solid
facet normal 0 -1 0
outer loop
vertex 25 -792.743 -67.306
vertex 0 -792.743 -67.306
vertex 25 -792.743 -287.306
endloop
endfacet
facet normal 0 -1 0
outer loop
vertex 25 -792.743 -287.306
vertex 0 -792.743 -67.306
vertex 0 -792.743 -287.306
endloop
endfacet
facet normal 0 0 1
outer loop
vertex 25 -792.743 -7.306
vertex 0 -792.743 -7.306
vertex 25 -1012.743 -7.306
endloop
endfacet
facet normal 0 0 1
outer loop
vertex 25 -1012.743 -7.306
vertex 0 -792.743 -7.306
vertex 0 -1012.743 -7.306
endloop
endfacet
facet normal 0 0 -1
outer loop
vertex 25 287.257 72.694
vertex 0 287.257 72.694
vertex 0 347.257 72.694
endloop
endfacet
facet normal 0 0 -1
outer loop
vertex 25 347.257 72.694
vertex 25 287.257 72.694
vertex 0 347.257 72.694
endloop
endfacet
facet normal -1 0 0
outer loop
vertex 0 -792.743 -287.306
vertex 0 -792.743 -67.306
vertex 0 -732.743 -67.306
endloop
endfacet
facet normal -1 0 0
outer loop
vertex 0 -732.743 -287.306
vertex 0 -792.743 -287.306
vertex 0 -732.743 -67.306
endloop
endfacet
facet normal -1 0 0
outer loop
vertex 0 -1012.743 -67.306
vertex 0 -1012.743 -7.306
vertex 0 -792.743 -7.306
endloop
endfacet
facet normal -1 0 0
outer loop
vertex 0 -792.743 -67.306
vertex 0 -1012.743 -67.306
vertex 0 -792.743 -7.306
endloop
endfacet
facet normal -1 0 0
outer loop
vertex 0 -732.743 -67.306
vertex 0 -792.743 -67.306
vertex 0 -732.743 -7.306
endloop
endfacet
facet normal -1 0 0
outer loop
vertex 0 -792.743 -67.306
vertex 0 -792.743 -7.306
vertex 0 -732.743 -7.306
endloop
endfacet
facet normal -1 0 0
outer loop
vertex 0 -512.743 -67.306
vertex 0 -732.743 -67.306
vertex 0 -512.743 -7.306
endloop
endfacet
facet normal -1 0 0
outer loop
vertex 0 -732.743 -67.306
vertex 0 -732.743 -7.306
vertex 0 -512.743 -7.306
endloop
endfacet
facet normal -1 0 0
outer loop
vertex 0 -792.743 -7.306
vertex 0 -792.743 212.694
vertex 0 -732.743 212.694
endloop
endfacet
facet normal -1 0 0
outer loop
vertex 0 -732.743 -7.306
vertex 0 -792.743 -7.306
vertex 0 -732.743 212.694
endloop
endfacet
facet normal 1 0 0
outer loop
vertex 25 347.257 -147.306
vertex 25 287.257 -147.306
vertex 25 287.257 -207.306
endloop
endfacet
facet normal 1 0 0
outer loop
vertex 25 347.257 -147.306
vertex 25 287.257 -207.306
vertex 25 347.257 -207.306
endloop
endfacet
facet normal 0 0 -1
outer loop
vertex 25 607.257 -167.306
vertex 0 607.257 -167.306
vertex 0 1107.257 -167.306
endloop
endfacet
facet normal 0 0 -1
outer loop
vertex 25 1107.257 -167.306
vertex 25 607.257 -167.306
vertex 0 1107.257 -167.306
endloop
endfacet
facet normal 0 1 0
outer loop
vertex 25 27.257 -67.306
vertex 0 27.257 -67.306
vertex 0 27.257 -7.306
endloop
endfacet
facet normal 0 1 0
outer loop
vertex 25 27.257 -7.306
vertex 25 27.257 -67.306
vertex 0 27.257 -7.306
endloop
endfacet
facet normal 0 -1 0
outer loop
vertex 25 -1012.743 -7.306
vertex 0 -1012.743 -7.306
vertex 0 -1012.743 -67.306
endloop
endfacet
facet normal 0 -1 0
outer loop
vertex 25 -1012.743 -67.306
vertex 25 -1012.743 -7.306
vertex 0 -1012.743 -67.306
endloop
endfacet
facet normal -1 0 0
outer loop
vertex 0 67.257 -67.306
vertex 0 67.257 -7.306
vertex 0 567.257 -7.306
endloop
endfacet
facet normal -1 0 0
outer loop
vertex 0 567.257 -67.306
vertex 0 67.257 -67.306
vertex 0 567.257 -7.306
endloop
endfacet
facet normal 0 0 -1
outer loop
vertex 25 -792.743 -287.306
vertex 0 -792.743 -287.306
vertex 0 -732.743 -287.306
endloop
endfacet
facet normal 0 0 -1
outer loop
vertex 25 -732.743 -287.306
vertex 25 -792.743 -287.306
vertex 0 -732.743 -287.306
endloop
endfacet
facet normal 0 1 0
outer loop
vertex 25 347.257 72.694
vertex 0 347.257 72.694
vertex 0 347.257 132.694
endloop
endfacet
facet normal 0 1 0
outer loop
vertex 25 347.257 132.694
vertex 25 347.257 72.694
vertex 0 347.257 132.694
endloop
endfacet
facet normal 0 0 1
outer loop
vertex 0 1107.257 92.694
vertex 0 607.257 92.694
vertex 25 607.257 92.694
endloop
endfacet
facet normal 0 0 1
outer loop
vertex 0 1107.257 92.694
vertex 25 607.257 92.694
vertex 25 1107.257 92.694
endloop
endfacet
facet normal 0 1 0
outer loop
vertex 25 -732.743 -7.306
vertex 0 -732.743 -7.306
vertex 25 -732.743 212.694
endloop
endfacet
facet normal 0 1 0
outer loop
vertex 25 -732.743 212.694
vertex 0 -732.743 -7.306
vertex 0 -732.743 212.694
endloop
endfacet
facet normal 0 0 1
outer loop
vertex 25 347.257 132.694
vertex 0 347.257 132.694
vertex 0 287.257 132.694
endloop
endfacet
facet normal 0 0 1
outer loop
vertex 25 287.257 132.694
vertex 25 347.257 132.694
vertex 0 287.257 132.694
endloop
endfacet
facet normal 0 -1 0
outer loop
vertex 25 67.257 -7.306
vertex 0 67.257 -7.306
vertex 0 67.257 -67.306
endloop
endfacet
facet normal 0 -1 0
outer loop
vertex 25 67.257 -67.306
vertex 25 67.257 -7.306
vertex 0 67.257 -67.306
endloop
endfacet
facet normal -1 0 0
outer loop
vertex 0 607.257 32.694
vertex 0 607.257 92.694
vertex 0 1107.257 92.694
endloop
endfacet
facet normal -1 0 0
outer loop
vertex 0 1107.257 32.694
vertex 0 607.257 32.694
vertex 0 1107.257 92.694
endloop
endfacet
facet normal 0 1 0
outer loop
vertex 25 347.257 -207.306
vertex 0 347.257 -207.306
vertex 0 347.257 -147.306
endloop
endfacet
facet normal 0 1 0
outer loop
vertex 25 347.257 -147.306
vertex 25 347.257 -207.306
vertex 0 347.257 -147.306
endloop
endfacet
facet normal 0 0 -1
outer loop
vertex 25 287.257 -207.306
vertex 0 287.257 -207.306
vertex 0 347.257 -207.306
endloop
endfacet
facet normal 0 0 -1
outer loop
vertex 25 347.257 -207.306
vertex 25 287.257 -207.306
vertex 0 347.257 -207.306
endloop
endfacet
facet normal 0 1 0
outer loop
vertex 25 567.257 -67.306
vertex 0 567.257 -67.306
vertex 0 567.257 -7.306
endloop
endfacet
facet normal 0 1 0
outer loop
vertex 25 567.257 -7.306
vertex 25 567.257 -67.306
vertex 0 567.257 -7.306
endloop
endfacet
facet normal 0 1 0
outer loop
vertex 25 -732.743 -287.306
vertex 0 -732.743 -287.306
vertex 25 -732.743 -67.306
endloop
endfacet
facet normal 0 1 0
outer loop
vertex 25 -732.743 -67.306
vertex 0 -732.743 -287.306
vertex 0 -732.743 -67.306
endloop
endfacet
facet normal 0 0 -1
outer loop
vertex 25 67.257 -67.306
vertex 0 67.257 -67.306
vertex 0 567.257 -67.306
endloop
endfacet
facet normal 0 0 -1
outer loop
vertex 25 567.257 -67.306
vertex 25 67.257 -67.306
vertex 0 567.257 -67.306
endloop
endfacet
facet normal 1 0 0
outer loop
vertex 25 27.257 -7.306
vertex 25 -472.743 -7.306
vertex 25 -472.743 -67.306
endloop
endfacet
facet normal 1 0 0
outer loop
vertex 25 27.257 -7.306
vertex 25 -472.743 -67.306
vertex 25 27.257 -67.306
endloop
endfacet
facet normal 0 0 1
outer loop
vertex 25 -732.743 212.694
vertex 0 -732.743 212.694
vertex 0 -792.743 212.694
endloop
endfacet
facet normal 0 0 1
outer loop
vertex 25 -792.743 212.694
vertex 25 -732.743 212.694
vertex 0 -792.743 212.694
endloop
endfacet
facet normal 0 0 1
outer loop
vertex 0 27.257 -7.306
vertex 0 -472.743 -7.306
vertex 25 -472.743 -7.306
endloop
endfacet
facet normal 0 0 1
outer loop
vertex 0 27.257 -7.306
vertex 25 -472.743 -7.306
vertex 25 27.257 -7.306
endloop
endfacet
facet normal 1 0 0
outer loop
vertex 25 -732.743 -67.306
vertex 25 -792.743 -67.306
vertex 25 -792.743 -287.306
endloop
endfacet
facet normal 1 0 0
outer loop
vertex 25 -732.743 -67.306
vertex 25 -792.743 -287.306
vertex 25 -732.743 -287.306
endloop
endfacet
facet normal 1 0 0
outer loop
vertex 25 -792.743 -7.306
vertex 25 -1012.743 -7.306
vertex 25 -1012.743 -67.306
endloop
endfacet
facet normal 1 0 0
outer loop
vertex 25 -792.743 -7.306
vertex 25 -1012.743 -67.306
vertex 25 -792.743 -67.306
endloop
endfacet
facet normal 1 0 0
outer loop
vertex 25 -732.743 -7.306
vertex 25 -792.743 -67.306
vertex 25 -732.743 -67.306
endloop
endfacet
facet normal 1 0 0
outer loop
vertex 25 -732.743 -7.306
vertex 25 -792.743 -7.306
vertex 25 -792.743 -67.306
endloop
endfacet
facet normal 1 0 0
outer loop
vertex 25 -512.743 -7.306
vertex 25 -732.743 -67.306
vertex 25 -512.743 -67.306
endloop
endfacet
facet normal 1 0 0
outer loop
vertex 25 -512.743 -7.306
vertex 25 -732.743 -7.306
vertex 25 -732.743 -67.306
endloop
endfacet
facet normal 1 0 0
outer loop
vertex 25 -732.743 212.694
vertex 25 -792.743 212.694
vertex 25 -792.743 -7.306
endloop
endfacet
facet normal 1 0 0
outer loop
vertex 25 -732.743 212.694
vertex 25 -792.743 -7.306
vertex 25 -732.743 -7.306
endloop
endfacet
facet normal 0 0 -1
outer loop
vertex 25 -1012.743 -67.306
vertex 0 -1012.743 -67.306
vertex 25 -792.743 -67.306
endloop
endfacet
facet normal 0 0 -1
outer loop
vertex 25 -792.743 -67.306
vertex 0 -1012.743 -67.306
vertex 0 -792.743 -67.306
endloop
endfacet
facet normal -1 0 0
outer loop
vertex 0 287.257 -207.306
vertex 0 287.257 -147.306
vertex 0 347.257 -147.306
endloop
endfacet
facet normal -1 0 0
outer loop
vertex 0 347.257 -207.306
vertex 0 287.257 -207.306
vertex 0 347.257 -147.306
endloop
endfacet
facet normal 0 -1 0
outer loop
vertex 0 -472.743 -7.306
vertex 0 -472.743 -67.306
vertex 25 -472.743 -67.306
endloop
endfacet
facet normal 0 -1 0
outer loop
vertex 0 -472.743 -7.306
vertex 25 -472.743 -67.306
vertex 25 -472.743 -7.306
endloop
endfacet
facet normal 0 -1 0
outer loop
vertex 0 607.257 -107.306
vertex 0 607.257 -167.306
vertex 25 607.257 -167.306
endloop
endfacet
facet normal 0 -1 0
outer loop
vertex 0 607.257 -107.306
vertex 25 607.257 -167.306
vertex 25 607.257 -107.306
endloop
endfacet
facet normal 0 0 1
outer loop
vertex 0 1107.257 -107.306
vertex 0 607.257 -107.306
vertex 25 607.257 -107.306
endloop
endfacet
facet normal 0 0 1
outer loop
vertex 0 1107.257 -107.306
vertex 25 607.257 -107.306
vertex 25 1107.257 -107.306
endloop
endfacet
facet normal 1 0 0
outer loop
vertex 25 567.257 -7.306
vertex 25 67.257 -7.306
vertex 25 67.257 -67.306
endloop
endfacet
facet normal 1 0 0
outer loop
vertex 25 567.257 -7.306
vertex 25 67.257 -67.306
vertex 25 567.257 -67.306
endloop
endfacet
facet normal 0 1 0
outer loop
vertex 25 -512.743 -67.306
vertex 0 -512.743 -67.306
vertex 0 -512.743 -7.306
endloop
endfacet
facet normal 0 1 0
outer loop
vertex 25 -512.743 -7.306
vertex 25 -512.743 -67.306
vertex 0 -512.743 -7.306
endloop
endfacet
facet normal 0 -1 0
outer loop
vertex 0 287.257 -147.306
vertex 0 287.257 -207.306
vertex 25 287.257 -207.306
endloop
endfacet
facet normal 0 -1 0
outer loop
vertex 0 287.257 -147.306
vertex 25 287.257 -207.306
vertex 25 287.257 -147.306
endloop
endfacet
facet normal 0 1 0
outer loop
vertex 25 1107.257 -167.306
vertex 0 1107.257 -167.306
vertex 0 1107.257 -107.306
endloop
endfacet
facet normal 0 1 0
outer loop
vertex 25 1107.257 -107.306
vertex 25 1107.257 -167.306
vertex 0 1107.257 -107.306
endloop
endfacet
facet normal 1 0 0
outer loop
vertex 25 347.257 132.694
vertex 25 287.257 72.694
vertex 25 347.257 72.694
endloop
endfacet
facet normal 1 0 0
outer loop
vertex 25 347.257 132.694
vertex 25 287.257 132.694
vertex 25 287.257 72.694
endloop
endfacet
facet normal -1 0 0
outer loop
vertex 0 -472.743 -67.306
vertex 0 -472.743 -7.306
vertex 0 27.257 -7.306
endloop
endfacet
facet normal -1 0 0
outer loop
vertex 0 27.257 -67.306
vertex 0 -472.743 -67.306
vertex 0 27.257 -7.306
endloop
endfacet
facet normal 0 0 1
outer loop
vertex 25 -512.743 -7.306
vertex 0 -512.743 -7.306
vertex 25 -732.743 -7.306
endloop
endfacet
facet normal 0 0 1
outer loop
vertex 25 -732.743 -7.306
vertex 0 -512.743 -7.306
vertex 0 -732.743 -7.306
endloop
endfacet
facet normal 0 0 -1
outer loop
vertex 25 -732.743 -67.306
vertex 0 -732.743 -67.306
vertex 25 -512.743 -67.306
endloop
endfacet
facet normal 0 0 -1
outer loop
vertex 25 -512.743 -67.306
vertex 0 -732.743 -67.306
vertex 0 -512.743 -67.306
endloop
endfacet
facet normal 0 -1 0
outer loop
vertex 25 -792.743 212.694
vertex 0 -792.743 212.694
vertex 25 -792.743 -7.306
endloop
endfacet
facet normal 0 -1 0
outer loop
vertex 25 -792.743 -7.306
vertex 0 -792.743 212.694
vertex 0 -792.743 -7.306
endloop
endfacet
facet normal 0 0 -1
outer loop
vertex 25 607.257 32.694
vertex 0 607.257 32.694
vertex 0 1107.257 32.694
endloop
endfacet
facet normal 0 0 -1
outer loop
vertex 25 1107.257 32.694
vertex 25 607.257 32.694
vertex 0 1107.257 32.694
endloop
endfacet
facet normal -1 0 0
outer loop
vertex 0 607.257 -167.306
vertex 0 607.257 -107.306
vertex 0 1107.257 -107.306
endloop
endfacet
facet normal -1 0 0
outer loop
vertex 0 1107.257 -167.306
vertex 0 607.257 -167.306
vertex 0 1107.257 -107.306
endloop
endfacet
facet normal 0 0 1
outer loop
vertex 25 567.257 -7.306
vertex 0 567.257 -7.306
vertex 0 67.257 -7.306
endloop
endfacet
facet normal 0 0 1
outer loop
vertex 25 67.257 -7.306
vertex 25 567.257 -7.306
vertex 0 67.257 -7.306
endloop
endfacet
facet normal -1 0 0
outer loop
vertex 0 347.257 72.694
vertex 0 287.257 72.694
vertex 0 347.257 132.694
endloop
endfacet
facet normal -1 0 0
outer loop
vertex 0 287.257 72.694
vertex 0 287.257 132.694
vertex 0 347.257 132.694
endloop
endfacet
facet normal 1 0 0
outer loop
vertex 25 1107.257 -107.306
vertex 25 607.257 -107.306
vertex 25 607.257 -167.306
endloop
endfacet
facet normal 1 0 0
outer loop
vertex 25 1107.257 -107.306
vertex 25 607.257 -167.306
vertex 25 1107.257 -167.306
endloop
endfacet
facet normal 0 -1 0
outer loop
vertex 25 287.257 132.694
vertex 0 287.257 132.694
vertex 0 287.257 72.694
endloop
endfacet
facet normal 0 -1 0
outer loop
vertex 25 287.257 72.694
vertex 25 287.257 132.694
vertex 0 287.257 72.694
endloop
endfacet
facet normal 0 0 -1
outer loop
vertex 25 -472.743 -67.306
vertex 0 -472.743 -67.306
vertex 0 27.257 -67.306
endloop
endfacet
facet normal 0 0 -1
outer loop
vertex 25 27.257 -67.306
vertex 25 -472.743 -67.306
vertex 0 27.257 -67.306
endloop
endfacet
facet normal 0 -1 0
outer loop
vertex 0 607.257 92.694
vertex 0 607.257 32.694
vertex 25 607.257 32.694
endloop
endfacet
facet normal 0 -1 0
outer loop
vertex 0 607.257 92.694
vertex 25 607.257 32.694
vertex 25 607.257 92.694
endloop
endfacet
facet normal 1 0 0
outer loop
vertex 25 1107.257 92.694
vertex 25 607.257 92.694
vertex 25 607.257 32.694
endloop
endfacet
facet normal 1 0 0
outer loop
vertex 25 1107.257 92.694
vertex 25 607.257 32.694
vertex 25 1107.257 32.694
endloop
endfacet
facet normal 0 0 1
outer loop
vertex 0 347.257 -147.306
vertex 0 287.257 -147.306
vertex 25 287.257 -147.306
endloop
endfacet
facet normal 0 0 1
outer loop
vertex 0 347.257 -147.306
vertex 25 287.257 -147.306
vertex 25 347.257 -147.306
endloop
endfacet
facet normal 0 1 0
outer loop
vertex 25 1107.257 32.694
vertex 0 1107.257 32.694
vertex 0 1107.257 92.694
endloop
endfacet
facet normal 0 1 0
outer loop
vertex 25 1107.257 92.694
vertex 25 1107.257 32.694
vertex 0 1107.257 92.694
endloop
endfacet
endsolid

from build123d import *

# Parameters (mm, degrees)
F0_W     = 500
F0_H     = 60
F0_W_2   = 60
F1_DEPTH = 25


with BuildPart() as f1:
    # F0 (on Right) → F1 (new body)
    with BuildSketch(Plane.YZ):
        Polygon((-762.742758, 212.694136), (-792.742758, 212.694136), (-792.742758, -7.305864), (-1012.742758, -7.305864), (-1012.742758, -37.305864), (-1012.742758, -67.305864), (-792.742758, -67.305864), (-792.742758, -287.305864), (-762.742758, -287.305864), (-732.742758, -287.305864), (-732.742758, -67.305864), (-512.742758, -67.305864), (-512.742758, -37.305864), (-512.742758, -7.305864), (-732.742758, -7.305864), (-732.742758, 212.694136), align=None)
        Polygon((317.257242, -7.305864), (67.257242, -7.305864), (67.257242, -67.305864), (317.257242, -67.305864), (567.257242, -67.305864), (567.257242, -7.305864), align=None)
        with Locations((-222.742758, -37.305864)):
            Rectangle(F0_W, F0_H)
        Polygon((287.257242, 72.694136), (317.257242, 72.694136), (317.257242, 102.694136), (317.257242, 132.694136), (287.257242, 132.694136), align=None)
        Polygon((317.257242, 102.694136), (317.257242, 72.694136), (347.257242, 72.694136), (347.257242, 132.694136), (317.257242, 132.694136), align=None)
        with Locations((317.257242, -177.305864)):
            Rectangle(F0_W_2, F0_H)
        with Locations((857.257242, 62.694136)):
            Rectangle(F0_W, F0_H)
        with Locations((857.257242, -137.305864)):
            Rectangle(F0_W, F0_H)
    extrude(amount=F1_DEPTH)


solid = f1.part
